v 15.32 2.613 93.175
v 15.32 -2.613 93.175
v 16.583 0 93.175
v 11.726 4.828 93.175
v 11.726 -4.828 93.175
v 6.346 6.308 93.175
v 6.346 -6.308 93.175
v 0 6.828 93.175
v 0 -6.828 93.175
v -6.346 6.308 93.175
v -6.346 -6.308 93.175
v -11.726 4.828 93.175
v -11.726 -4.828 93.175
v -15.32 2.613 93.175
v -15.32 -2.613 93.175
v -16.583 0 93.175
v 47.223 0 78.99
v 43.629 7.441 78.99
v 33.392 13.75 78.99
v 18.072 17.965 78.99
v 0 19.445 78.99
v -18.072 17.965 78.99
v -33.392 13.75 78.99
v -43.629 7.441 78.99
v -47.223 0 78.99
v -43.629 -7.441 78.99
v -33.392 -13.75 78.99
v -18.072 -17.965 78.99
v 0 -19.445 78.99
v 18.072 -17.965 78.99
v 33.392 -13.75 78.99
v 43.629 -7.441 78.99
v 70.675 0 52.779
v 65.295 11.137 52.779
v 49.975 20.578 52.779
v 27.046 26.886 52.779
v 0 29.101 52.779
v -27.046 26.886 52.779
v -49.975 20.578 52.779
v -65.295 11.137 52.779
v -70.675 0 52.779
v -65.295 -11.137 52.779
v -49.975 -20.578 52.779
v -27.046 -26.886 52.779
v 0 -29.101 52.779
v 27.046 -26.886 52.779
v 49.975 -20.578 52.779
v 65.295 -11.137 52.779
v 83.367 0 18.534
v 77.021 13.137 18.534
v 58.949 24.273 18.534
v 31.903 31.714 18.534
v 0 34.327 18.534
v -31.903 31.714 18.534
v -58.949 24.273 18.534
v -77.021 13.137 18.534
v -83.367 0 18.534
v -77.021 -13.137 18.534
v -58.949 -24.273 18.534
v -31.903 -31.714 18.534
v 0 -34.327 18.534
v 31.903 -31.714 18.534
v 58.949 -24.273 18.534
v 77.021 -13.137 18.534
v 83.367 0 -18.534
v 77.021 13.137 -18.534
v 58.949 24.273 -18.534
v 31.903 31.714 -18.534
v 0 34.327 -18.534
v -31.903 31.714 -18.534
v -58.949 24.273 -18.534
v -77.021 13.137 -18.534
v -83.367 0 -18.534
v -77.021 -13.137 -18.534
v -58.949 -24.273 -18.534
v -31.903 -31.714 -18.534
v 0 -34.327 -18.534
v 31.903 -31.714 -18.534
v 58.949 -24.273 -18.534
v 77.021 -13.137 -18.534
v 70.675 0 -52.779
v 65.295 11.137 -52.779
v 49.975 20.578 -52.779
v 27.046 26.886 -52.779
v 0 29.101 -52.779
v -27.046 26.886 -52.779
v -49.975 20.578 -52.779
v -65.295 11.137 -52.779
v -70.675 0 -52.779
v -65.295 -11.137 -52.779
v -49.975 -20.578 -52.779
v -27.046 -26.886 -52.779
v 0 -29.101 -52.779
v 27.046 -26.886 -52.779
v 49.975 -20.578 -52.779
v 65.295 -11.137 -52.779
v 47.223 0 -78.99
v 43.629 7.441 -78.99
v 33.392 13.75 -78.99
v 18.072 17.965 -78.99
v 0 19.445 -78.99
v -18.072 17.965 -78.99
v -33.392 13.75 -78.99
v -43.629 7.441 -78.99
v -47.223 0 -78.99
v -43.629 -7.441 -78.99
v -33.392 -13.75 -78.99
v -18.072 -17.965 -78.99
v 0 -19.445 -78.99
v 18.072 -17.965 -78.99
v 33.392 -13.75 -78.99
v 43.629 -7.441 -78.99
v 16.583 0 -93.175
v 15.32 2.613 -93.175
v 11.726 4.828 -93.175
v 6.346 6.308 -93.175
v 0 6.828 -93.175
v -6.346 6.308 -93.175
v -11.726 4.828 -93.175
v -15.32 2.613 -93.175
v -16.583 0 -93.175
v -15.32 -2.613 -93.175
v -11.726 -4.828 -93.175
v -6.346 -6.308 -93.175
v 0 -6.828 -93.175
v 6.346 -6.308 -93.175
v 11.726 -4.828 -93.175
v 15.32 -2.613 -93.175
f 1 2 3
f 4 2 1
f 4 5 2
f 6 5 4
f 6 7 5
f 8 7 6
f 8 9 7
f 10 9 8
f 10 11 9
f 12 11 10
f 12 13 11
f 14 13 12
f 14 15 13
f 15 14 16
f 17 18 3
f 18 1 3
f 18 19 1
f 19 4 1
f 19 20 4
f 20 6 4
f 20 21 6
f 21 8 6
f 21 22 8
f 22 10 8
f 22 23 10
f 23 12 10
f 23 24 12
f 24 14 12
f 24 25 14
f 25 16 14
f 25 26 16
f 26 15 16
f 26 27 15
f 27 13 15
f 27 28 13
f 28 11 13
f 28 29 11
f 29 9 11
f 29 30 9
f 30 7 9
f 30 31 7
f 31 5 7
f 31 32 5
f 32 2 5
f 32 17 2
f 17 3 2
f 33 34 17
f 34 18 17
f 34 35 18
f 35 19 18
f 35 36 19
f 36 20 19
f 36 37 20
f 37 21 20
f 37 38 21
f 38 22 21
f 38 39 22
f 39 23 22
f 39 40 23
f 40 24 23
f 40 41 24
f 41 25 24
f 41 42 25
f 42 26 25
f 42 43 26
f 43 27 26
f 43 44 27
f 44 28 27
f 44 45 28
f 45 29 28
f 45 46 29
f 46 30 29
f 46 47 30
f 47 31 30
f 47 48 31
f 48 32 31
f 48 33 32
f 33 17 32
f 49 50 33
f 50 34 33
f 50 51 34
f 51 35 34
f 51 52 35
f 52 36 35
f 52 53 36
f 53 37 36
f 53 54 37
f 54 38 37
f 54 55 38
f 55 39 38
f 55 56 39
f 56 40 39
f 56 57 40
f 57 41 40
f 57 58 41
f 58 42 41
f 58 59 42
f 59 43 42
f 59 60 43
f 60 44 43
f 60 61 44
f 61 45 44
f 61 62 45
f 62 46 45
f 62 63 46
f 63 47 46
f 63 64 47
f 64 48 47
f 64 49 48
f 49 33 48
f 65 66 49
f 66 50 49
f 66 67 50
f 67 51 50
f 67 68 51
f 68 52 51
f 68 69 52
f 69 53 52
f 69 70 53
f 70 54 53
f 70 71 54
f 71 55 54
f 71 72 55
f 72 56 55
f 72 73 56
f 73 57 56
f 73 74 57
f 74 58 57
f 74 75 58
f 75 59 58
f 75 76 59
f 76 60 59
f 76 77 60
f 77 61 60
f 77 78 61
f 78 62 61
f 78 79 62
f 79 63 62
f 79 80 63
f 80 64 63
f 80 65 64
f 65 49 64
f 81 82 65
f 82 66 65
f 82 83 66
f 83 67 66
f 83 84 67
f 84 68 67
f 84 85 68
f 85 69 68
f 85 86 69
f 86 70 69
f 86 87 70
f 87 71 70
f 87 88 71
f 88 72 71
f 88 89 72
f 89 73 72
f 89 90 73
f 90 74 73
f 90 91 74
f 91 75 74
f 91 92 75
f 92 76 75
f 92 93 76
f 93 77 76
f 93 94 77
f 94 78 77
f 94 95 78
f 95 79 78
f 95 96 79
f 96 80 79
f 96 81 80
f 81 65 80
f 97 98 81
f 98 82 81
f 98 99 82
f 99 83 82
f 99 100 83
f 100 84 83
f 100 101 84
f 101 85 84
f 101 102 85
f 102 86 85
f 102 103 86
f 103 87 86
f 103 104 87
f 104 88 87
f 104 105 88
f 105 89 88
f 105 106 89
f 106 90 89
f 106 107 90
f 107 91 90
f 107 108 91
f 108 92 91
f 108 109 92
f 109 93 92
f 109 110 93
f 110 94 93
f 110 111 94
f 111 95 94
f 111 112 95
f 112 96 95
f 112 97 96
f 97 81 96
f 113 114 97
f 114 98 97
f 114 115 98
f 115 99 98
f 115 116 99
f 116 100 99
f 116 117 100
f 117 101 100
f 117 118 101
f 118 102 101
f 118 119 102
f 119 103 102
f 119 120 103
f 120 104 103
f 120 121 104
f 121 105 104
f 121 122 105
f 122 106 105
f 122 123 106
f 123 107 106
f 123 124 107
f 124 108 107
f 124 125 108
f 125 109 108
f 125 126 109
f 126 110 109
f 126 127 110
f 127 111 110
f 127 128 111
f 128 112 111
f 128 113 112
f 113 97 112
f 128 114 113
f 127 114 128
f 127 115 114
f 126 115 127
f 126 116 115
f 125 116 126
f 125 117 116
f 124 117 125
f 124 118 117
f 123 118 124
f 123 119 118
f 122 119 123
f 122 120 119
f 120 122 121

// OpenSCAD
// Generated by SolidPython 1.0.1 on 2020-07-29 00:46:52


scale(v = [17, 7, 19]) {
	sphere(r = 5);
}
/***********************************************
*********      SolidPython code:      **********
************************************************
 
# import packages: SolidPython
from solid import *
from solid.utils import *
from itertools import chain, combinations, permutations


class Resize:

    def __init__(self, scad_file):
        self.scad_file = scad_file
        #self.scad_file = import_scad(scad_file)
        # cone/cylinder param:
        self.r1 = 0
        self.r2 = 0
        self.h = 0
        # rectangular prism param:
        self.w = 0
        self.l = 0
        # ellipse param:
        self.r = 0

    # import OpenScad code (file name corresponds to shape)


    # classify shape + parameters
    def assign(self, param1, param2, param3):
        if self.scad_file == 'cone.scad':
            self.r1 = param1
            self.r2 = param2
            self.h = param3
        elif self.scad_file == 'cylinder.scad':
            self.r1 = param1
            self.r2 = param2
            self.h = param3
        elif self.scad_file == 'rectangularPrism.scad':
            self.h = param1
            self.l = param2
            self.w = param3
        else:
            self.r = param1
            self.h = param2

    # resize parameters
    def iterate(self):
        x = range(3, 20, 2)
        i = 1
        if self.scad_file == 'cone.scad':
            tempList = list(permutations(x, 2))
            for temp in tempList:
                param1 = temp[0]
                param2 = temp[1]
                filepath = 'produced_scad_files/' + 'cone' + str(param1) + '_' + str(param2) + '_' + '.scad'
                scad_render_to_file(cylinder(h=param1, r1=param2, r2=0), filepath)

        elif self.scad_file == 'cylinder.scad':
            tempList = list(permutations(x, 3))
            for temp in tempList:
                param1 = temp[0]
                param2 = temp[1]
                filepath = 'produced_scad_files/' + 'cylinder' + str(param1) + '_' + str(param2) + '_' + '.scad'
                scad_render_to_file(cylinder(h=param1, r1=param2, r2=param2), filepath)

        elif self.scad_file == 'rectangularPrism.scad':
            tempList = list(permutations(x, 3))
            for temp in tempList:
                param1 = temp[0]
                param2 = temp[1]
                param3 = temp[2]
                filepath = 'produced_scad_files/' + 'rectangularPrism' + str(param1) + '_' + str(param2) + '_' + str(
                    param3) + '.scad'
                scad_render_to_file(cube(size=(param1, param2, param3)), filepath)

        elif self.scad_file == 'ellipse.scad':
            tempList = list(permutations(x, 4))
            for temp in tempList:
                param1 = temp[0]
                param2 = temp[1]
                param3 = temp[2]
                param4 = temp[3]
                filepath = 'produced_scad_files/' + 'ellipse' + str(param1) + '_' + str(param2) + '_' + str(param3) + '_' + str(param4) + '.scad'
                scad_render_to_file(scale([param1, param2, param3])(sphere(r=param4)), filepath)

    def render_to_scadfile(self):
        scad_render_to_file(scad, 'example.scad') 
 
************************************************/
